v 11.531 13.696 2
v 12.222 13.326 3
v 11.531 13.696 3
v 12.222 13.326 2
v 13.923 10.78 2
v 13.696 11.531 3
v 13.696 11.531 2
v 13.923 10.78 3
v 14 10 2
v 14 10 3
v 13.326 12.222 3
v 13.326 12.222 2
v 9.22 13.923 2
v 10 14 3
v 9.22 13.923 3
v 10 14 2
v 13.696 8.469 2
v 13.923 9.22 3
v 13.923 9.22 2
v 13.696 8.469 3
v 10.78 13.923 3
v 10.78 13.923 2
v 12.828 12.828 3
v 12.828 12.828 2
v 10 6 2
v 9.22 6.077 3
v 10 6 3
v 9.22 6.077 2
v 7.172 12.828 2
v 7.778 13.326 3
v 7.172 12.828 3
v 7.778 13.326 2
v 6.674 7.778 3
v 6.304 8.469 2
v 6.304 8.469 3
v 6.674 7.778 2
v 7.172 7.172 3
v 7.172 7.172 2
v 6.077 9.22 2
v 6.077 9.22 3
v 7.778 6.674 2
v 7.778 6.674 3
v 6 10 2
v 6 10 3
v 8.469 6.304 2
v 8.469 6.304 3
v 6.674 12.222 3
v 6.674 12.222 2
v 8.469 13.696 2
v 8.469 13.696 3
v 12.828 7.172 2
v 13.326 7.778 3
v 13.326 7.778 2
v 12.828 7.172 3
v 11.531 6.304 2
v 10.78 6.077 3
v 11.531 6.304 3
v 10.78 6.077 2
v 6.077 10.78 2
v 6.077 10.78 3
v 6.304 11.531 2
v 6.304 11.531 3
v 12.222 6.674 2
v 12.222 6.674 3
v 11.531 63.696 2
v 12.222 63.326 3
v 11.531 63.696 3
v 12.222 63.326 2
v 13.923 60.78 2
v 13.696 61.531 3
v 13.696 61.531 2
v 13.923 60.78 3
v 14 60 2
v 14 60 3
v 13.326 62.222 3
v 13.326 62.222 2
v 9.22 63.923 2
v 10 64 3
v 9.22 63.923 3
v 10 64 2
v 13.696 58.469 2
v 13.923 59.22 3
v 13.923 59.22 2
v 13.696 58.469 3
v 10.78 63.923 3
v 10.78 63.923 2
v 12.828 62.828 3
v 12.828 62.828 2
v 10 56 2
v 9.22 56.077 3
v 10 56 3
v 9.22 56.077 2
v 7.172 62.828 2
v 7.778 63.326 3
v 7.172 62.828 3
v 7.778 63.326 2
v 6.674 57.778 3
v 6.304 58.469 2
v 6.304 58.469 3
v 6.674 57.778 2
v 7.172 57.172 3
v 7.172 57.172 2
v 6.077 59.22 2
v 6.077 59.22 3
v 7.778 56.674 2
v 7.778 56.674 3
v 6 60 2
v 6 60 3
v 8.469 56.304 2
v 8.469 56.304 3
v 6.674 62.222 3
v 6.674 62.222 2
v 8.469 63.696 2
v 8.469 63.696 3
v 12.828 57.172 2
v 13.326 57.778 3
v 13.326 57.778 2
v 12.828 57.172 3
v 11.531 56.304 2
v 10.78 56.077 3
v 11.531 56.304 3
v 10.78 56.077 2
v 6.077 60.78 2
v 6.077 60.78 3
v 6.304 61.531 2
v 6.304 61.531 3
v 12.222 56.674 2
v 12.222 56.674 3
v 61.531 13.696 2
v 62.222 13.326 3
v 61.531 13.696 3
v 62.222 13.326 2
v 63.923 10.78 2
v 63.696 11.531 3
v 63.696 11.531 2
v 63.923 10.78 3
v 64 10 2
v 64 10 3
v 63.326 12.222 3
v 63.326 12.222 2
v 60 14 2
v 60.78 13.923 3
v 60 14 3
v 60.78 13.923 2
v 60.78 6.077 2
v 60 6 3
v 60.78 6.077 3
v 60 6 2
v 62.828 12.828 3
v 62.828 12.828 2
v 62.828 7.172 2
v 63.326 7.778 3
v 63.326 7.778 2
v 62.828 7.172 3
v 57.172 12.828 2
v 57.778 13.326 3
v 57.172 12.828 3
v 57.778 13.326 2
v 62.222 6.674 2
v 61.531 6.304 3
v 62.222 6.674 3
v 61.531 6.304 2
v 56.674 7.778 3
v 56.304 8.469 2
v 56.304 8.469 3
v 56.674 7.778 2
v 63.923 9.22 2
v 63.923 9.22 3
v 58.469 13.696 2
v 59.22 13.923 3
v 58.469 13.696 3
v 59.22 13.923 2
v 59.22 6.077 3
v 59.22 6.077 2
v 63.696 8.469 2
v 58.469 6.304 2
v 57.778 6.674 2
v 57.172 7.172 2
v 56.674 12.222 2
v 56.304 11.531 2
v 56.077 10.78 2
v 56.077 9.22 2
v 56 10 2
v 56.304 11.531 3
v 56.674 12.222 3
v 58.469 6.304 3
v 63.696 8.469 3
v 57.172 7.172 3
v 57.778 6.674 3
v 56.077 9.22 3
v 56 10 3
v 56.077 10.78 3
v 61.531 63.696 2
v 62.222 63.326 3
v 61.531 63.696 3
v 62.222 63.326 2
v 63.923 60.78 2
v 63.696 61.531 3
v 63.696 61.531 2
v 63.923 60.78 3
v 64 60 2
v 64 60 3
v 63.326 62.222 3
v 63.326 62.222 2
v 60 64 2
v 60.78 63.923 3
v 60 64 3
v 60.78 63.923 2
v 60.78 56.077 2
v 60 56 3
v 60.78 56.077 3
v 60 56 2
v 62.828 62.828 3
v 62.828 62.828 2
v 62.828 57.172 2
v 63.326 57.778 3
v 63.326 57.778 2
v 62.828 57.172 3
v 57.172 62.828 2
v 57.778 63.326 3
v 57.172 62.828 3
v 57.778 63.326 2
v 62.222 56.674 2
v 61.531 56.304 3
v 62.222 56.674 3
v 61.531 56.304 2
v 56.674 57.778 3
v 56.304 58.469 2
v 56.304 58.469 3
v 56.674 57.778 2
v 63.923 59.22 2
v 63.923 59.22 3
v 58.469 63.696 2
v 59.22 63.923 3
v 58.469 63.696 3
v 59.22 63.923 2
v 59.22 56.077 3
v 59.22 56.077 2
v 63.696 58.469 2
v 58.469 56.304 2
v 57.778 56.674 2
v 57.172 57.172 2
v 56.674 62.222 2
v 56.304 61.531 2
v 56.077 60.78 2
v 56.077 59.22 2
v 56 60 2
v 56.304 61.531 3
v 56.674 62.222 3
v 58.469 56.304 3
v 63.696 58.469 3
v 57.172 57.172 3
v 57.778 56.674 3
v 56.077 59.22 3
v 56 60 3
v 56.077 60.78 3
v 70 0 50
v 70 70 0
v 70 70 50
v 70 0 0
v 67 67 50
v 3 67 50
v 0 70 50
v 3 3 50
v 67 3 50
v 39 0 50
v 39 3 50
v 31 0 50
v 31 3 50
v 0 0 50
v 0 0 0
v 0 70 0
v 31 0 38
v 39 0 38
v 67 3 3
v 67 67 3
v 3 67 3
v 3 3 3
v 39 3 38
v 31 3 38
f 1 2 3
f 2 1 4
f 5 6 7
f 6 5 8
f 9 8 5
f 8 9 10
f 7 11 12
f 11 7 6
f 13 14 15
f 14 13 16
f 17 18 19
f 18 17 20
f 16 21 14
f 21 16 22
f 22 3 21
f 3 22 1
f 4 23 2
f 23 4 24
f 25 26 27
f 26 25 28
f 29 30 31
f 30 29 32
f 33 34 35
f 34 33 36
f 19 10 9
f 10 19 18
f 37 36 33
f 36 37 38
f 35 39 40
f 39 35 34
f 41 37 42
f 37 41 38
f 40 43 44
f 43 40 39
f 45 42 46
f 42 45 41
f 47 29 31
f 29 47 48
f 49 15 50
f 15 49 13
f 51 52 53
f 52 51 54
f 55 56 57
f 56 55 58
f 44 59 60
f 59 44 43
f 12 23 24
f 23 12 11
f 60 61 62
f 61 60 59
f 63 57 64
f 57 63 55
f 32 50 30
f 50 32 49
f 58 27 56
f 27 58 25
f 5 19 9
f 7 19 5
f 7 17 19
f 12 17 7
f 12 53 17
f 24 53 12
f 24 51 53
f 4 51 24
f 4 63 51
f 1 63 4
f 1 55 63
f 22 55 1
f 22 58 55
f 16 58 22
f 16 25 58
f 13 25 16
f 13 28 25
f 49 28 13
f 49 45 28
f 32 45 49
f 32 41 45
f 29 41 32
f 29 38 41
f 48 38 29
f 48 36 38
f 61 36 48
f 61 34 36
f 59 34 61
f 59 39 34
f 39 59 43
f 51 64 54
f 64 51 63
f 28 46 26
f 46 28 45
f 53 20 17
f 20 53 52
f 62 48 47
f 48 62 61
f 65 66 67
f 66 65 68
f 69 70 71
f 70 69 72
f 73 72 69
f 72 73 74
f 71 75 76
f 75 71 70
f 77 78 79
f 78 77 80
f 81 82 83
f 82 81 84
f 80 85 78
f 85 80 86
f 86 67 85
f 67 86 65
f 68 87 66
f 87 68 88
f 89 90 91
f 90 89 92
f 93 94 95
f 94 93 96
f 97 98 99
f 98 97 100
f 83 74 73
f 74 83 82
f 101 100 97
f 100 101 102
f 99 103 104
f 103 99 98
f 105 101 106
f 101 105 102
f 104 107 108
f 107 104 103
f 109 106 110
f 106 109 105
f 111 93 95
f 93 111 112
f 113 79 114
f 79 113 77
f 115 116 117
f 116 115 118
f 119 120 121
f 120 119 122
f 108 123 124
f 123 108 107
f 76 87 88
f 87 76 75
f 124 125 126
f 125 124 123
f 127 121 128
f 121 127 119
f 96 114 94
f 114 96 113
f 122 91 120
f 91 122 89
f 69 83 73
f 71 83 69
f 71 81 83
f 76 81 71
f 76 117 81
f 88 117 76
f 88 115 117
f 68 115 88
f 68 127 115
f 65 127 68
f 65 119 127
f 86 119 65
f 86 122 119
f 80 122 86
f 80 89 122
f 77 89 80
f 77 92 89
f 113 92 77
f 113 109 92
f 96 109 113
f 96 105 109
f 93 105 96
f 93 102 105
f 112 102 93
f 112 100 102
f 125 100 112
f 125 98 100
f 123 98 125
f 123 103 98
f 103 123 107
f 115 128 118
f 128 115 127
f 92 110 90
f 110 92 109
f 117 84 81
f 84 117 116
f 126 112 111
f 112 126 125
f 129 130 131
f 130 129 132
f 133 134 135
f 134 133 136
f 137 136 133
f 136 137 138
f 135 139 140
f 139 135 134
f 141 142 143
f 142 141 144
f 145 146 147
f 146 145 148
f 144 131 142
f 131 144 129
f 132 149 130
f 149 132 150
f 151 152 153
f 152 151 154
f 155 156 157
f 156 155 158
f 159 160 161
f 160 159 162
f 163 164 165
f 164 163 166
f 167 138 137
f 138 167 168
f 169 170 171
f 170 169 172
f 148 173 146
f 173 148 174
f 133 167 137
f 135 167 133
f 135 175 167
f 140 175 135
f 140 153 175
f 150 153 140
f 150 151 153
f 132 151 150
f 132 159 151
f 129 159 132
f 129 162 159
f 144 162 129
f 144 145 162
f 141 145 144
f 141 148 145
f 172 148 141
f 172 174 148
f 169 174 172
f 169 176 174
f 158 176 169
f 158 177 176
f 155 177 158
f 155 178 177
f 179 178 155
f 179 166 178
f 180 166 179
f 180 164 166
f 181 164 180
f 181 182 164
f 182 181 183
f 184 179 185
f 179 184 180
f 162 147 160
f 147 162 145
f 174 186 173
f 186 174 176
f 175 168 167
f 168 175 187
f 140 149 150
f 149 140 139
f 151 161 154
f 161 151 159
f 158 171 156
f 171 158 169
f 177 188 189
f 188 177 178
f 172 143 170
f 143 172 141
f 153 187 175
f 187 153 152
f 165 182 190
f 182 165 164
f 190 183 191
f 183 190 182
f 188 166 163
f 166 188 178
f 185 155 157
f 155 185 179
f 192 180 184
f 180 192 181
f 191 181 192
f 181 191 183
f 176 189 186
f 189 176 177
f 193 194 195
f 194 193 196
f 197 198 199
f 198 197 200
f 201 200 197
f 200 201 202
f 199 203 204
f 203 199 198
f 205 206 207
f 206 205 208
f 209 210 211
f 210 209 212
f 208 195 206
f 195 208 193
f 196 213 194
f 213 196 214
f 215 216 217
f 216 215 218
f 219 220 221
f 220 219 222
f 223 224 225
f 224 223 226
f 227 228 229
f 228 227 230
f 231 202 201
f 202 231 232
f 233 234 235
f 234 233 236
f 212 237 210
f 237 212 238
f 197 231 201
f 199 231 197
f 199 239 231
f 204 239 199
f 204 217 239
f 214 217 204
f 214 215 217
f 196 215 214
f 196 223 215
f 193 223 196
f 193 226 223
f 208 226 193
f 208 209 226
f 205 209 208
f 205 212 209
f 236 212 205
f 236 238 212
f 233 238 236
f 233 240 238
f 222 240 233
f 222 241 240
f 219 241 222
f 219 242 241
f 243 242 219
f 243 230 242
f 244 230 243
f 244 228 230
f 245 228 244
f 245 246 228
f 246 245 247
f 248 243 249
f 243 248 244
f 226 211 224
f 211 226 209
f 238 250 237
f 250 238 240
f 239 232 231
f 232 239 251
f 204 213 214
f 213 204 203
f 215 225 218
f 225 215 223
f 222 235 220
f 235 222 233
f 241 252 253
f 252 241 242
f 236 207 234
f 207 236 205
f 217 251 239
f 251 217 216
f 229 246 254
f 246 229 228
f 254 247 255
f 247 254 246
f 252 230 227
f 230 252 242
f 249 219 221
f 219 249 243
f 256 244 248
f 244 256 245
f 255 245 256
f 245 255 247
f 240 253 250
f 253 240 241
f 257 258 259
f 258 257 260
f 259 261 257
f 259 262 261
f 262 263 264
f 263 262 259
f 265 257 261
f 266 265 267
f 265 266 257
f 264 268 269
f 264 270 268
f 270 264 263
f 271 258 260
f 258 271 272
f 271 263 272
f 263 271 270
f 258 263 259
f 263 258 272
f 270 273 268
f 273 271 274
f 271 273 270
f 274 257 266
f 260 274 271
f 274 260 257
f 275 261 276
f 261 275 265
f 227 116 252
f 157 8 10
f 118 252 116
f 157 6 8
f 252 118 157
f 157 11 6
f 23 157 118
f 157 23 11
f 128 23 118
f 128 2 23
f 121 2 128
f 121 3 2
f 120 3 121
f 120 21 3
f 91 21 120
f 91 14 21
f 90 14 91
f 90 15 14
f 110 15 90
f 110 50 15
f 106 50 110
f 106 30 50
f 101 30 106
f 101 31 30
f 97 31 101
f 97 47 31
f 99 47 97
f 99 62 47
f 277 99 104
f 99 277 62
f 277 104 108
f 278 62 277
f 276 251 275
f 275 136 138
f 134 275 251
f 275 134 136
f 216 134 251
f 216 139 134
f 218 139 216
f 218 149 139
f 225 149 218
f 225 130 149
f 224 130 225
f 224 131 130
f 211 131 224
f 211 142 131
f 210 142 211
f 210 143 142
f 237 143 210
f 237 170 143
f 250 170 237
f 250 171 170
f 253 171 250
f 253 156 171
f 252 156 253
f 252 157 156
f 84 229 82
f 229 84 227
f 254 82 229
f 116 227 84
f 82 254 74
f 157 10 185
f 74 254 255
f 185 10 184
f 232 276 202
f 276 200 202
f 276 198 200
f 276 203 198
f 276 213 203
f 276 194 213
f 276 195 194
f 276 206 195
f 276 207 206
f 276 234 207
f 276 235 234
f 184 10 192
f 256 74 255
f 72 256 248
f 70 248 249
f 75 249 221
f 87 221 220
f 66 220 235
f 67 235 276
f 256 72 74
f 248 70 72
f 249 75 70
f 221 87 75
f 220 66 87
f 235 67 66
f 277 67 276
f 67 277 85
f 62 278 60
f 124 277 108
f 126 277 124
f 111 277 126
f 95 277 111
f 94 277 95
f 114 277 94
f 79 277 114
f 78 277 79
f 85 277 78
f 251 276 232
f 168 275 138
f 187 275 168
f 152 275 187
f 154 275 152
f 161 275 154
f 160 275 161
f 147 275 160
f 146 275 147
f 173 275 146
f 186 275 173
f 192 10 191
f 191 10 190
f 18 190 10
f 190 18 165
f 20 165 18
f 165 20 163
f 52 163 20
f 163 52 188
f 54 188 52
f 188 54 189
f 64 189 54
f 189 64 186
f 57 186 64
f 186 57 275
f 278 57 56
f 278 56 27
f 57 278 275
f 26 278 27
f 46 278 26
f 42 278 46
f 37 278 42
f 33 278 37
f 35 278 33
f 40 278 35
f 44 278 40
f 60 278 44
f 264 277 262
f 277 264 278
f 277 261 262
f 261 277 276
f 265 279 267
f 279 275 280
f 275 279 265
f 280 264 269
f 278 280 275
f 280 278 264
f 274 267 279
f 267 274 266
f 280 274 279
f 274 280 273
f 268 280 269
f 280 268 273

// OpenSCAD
$fn = 32;

// ----------------------------------------------------------------------
// Enclosure box: both enclosure
// ----------------------------------------------------------------------

// --- parameters (mm) ---
box_l = 70;               // outer length, X
box_w = 70;               // outer width, Y
box_h = 50;               // outer height
wall_t = 3;               // wall thickness
boss_r = 4;               // corner boss radius
hole_r = 2;               // boss screw hole radius
boss_in = 10;             // boss inset from the corners
notch_w = 8;              // cable notch width
notch_h = 12;             // cable notch height

inner_h = box_h - wall_t;  // cavity depth
boss_h = inner_h - 2;  // corner boss height

difference() {
  cube([box_l, box_w, box_h]);
  translate([wall_t, wall_t, wall_t])
    cube([box_l - 2 * wall_t, box_w - 2 * wall_t, box_h]);
  for (sx = [0, 1], sy = [0, 1])
    translate([sx ? box_l - boss_in : boss_in,
               sy ? box_w - boss_in : boss_in, wall_t - 1]) {
      cylinder(r = boss_r, h = boss_h);
      translate([0, 0, boss_h - 4])
        cylinder(r = hole_r, h = 5);
    }
  translate([box_l / 2 - notch_w / 2, -1, box_h - notch_h])
    cube([notch_w, wall_t + 2, notch_h + 1]);
}
